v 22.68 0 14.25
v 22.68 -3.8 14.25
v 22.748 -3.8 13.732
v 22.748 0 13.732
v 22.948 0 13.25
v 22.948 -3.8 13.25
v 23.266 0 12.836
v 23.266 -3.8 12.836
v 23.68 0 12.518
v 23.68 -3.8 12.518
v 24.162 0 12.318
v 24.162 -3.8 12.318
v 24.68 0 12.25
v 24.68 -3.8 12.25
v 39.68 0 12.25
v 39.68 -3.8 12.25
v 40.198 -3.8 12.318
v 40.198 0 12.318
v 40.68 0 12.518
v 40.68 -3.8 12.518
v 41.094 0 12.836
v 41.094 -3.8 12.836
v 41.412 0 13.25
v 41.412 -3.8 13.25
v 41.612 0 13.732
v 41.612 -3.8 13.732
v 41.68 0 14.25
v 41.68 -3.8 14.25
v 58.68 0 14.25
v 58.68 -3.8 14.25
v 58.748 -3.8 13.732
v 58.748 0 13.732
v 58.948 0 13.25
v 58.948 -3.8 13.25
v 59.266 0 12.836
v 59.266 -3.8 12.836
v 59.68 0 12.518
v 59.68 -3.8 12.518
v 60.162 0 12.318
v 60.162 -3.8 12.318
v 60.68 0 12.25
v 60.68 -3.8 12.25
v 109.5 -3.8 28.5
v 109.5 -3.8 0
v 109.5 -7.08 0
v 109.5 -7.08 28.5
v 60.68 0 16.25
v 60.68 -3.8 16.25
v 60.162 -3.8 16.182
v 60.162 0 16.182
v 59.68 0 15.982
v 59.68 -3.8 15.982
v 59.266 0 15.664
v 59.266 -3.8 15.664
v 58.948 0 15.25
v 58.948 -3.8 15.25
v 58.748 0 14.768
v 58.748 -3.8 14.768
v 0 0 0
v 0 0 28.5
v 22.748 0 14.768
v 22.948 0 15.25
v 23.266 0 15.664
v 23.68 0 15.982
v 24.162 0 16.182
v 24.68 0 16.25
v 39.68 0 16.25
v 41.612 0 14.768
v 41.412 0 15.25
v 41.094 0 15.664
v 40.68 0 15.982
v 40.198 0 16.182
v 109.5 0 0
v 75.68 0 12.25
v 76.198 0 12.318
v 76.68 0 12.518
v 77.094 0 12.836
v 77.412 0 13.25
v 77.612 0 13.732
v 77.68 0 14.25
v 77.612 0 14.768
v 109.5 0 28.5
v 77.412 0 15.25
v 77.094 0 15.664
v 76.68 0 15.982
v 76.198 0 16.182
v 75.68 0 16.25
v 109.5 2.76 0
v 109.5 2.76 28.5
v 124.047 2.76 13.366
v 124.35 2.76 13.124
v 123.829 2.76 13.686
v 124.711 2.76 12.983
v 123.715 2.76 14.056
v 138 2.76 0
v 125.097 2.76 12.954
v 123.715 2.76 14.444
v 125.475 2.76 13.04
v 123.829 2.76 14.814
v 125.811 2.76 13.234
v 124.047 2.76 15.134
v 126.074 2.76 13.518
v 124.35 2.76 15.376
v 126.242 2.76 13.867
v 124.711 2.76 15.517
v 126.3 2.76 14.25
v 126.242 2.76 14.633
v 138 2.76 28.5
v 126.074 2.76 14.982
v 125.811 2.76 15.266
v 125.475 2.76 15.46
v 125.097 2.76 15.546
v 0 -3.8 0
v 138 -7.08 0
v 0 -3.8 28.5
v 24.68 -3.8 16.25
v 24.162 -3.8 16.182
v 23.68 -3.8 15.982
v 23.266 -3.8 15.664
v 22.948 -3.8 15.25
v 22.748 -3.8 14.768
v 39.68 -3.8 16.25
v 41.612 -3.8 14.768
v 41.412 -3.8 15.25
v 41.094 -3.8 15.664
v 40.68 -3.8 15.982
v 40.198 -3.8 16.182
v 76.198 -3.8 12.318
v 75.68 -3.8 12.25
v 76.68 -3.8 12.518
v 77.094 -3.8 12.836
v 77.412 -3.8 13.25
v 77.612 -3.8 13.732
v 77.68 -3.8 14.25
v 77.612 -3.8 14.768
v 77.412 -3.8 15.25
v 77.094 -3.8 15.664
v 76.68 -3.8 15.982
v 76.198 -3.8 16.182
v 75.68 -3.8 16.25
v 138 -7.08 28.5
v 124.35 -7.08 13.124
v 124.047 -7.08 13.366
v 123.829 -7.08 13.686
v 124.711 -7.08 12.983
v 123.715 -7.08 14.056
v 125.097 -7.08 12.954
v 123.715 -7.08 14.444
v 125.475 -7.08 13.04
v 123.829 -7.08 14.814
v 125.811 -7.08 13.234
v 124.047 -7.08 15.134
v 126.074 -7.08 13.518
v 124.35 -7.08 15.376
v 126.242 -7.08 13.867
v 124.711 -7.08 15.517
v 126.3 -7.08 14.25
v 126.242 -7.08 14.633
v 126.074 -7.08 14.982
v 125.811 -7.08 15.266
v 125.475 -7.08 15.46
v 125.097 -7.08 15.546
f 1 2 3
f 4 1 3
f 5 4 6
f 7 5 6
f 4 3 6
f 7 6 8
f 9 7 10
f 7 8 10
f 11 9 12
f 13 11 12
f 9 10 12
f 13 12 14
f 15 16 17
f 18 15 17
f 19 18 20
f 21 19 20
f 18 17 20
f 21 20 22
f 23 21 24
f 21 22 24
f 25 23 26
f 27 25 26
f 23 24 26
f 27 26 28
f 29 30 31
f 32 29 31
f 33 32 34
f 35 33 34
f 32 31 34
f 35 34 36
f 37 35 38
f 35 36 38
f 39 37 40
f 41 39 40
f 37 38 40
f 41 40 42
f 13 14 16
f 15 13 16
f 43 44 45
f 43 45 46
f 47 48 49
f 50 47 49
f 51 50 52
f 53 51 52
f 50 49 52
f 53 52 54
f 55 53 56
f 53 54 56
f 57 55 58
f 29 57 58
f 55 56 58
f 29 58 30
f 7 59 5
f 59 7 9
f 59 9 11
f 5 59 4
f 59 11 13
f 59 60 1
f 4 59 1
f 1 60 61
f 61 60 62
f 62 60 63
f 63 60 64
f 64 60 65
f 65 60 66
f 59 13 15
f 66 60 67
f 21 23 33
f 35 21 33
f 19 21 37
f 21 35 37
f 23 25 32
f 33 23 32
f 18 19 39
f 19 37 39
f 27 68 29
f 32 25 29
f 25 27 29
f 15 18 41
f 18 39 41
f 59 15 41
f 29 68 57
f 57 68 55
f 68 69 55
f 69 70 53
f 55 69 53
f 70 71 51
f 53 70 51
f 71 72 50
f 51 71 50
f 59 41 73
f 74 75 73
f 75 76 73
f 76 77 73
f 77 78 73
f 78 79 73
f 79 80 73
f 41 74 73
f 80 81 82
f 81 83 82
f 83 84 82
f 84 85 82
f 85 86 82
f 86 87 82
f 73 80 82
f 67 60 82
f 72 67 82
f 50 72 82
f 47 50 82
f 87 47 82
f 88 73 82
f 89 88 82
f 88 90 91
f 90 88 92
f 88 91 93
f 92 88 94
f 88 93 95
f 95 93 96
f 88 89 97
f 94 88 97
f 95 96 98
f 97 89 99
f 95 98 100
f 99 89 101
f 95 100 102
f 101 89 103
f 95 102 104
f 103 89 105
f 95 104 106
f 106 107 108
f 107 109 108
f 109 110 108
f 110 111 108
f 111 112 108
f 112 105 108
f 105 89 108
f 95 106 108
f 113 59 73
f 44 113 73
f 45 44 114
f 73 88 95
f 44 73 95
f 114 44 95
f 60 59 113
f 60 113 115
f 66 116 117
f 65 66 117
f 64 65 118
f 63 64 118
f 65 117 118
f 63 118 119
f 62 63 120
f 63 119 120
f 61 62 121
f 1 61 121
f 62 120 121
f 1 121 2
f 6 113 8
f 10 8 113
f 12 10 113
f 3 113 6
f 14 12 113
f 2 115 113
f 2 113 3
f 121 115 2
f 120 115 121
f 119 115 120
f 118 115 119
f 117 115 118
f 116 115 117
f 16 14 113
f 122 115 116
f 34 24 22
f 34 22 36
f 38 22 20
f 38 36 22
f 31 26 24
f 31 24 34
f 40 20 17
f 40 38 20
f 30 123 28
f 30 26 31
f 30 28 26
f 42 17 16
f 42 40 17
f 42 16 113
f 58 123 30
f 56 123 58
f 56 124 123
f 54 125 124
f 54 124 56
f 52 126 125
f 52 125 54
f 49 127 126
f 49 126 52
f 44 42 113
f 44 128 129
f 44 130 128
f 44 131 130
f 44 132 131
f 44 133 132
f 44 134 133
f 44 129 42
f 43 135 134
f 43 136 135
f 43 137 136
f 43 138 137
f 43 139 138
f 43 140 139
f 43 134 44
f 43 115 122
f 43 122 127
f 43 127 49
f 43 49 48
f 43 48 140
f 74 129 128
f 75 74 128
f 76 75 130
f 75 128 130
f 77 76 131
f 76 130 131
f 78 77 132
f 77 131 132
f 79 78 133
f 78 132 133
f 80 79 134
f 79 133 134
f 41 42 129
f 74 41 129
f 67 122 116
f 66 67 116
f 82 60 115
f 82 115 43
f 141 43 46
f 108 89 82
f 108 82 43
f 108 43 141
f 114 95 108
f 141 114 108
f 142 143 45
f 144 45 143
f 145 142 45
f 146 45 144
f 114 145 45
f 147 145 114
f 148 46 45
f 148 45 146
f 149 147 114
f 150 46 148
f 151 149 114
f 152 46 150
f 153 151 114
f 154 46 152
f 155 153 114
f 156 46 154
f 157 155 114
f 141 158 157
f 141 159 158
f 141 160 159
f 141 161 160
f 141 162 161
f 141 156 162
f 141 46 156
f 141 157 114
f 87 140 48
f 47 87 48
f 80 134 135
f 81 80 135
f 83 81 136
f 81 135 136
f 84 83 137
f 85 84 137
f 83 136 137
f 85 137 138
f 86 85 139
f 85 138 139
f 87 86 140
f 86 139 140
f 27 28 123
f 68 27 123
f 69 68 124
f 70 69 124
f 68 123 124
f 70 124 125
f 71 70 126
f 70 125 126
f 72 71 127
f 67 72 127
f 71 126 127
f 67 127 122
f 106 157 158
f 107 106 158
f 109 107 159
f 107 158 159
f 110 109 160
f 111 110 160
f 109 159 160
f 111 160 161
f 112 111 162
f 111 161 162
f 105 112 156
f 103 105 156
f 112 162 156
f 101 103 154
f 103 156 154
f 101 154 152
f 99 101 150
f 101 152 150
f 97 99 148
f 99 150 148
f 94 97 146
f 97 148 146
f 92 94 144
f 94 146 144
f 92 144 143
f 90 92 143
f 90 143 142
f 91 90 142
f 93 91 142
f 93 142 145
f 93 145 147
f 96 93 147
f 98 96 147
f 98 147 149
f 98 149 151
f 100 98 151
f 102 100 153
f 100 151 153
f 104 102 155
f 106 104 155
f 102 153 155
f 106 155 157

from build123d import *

# Parameters (mm, degrees)
F0_W          = 138
F0_H          = 28.5
F1_DEPTH      = 3.8
F2_W          = 28.5
F2_H          = 28.5
F3_DEPTH      = 3.28
F3_DEPTH_BACK = 6.56
F5_R          = 1.3
F6_DEPTH      = 9.84
F7_DEPTH      = 3.8


with BuildPart() as f1:
    # F0 (on Front) → F1 (new body)
    with BuildSketch(Plane.XZ):
        with Locations((69, 14.25)):
            Rectangle(F0_W, F0_H)
    extrude(amount=F1_DEPTH)

    # F2 (on face) → F3 (join, two sides)
    with BuildSketch(Plane.XZ.offset(3.8)) as f3_sk:
        with Locations((123.75, 14.25)):
            Rectangle(F2_W, F2_H)
    extrude(amount=F3_DEPTH)
    extrude(f3_sk.sketch, amount=-F3_DEPTH_BACK)

    # F5 (on face) → F6 (cut, through all)
    with BuildSketch(Plane.XZ.offset(7.08)):
        with Locations((125, 14.25)):
            Circle(F5_R)
    extrude(amount=-F6_DEPTH, mode=Mode.SUBTRACT)

    # F4 (on face) → F7 (cut, through all)
    with BuildSketch(Plane.XZ.offset(3.8)):
        with BuildLine():
            ThreePointArc((24.68, 16.25), (23.265786, 15.664214), (22.68, 14.25))
            Line((22.68, 14.25), (41.68, 14.25))
            ThreePointArc((41.68, 14.25), (41.094214, 15.664214), (39.68, 16.25))
            Line((39.68, 16.25), (24.68, 16.25))
        make_face()
        with BuildLine():
            ThreePointArc((60.68, 16.25), (59.265786, 15.664214), (58.68, 14.25))
            Line((58.68, 14.25), (77.68, 14.25))
            ThreePointArc((77.68, 14.25), (77.094214, 15.664214), (75.68, 16.25))
            Line((75.68, 16.25), (60.68, 16.25))
        make_face()
        with BuildLine():
            Line((77.68, 14.25), (58.68, 14.25))
            ThreePointArc((58.68, 14.25), (59.265786, 12.835786), (60.68, 12.25))
            Line((60.68, 12.25), (75.68, 12.25))
            ThreePointArc((75.68, 12.25), (77.094214, 12.835786), (77.68, 14.25))
        make_face()
        with BuildLine():
            Line((41.68, 14.25), (22.68, 14.25))
            ThreePointArc((22.68, 14.25), (23.265786, 12.835786), (24.68, 12.25))
            Line((24.68, 12.25), (39.68, 12.25))
            ThreePointArc((39.68, 12.25), (41.094214, 12.835786), (41.68, 14.25))
        make_face()
    extrude(amount=-F7_DEPTH, mode=Mode.SUBTRACT)


solid = f1.part
